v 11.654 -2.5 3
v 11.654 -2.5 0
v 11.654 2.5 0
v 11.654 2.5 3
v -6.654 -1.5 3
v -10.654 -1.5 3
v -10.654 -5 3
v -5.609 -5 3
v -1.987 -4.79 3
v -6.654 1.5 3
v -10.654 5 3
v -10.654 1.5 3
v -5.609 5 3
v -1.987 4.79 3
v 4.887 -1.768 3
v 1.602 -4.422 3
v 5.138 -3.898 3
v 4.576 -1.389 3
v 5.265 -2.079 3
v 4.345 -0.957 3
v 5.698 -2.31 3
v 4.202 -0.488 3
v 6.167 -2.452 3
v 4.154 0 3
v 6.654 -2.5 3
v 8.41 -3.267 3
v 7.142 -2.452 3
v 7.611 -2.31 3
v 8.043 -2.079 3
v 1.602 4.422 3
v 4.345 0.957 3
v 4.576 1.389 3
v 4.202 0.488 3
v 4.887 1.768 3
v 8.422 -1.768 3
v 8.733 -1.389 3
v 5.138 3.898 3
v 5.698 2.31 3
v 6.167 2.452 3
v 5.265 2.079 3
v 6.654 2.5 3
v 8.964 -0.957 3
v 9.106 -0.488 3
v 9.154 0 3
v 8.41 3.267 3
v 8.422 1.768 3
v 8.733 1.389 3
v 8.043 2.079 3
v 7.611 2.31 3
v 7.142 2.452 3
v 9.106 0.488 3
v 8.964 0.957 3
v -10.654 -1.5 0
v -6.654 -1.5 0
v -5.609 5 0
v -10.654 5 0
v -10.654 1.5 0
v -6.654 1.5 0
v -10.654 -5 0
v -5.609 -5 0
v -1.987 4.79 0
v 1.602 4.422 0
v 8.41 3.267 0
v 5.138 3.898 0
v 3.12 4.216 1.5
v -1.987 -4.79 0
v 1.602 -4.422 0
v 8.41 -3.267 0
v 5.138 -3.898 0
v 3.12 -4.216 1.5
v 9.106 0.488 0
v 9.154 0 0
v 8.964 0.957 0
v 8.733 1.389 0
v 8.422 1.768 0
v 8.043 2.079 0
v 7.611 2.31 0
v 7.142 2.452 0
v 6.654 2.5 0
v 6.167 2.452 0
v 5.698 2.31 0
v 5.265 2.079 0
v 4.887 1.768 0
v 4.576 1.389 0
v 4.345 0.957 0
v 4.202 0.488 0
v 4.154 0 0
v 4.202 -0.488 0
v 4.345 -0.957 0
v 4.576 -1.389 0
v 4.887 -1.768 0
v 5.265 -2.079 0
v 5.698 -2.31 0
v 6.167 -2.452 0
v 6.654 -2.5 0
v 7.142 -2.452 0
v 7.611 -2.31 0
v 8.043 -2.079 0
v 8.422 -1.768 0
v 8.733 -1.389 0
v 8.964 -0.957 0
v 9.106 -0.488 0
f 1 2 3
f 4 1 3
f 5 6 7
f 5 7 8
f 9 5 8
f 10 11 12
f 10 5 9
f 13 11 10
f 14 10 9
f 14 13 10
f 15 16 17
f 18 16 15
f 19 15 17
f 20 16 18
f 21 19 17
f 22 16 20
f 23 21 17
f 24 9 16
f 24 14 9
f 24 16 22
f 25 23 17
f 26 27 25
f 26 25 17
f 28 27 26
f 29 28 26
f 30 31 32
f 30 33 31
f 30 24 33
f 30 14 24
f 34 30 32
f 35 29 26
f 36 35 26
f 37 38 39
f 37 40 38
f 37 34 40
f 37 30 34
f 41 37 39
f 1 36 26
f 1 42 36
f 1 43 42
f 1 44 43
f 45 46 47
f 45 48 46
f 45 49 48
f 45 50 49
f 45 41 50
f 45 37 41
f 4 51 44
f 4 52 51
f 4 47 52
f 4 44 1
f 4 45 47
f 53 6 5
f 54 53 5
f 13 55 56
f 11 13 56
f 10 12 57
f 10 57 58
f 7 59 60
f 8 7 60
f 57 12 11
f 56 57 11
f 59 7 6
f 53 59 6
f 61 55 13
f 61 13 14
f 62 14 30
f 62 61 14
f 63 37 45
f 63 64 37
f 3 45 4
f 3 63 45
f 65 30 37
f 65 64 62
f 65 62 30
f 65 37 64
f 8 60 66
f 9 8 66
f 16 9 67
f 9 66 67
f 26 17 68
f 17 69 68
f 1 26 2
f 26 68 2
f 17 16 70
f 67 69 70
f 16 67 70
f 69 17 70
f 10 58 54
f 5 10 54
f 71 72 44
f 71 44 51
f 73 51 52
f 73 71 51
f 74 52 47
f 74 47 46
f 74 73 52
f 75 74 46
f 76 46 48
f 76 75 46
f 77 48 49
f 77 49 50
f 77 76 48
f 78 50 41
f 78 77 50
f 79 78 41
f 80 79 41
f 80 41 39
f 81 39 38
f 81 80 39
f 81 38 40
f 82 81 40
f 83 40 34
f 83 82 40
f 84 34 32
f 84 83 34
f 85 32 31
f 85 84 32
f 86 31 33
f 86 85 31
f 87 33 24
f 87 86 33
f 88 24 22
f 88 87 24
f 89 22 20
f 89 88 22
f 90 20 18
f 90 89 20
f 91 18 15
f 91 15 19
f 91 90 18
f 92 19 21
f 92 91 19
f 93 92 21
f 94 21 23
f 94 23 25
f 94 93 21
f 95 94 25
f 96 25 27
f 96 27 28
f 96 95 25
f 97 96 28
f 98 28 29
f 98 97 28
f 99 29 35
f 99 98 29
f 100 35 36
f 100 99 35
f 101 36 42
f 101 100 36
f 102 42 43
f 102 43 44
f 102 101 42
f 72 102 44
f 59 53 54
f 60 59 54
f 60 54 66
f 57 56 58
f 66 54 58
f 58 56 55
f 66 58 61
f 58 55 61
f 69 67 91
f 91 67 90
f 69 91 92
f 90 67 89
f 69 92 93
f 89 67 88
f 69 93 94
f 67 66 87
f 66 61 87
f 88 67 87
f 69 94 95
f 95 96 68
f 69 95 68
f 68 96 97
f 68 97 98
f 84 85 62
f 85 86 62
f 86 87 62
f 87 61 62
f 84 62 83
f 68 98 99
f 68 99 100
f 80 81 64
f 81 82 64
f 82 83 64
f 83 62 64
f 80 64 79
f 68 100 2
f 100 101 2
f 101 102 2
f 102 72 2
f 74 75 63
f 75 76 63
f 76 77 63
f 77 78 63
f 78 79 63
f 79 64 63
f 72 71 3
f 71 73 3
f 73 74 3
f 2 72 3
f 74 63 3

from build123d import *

# Parameters (mm, degrees)
SKETCH1_R           = 2.5
BOSS_EXTRUDE1_DEPTH = 3
SKETCH2_W           = 5
SKETCH2_H           = 1
BOSS_EXTRUDE2_DEPTH = 3
CUT_EXTRUDE1_REACH  = 15.032
SKETCH3_W           = 1
SKETCH3_H           = 3.5


with BuildPart() as part:
    # Sketch1 → Boss-Extrude1 (new body)
    with BuildSketch(Plane.XY):
        with BuildLine():
            Line((-6.654411765, -2.5), (-11.654411765, -2.5))
            Line((-11.654411765, -2.5), (-11.654411765, -5))
            Line((-11.654411765, -5), (-5.608785246, -5))
            add(Edge.make_bspline(
                [(-5.608785246, -5), (3.217675956, -4.682890968), (11.654411765, -2.5)],
                knots=[0.187203543, 0.187203543, 0.187203543, 0.737930507, 0.737930507, 0.737930507], degree=2))
            Line((11.654411765, -2.5), (11.654411765, 2.5))
            add(Edge.make_bspline(
                [(-5.608785246, 5), (3.217675956, 4.682890968), (11.654411765, 2.5)],
                knots=[0.187203543, 0.187203543, 0.187203543, 0.737930507, 0.737930507, 0.737930507], degree=2))
            Line((-5.608785246, 5), (-11.654411765, 5))
            Line((-11.654411765, 5), (-11.654411765, 2.5))
            Line((-11.654411765, 2.5), (-6.654411765, 2.5))
            Line((-6.654411765, 2.5), (-6.654411765, -2.5))
        make_face()
        with Locations((6.654411765, 0)):
            Circle(SKETCH1_R, mode=Mode.SUBTRACT)
    extrude(amount=BOSS_EXTRUDE1_DEPTH)

    # Sketch2 → Boss-Extrude2 (add)
    with BuildSketch(Plane.XY.offset(3)):
        with Locations((-9.154411765, 2)):
            Rectangle(SKETCH2_W, SKETCH2_H)
        with Locations((-9.154411765, -2)):
            Rectangle(SKETCH2_W, SKETCH2_H)
    extrude(amount=-BOSS_EXTRUDE2_DEPTH)

    # Sketch3 → Cut-Extrude1 (cut, up to next)
    with BuildSketch(Plane.XY.offset(3), mode=Mode.PRIVATE) as cut_extrude1_sk1:
        with Locations((-11.154411765, 3.25)):
            Rectangle(SKETCH3_W, SKETCH3_H)
    cut_extrude1_tool1 = extrude(cut_extrude1_sk1.sketch, amount=-CUT_EXTRUDE1_REACH, mode=Mode.PRIVATE) & part.part
    # Sketch3 → Cut-Extrude1 (cut, up to next)
    with BuildSketch(Plane.XY.offset(3), mode=Mode.PRIVATE) as cut_extrude1_sk2:
        with Locations((-11.154411765, -3.25)):
            Rectangle(SKETCH3_W, SKETCH3_H)
    cut_extrude1_tool2 = extrude(cut_extrude1_sk2.sketch, amount=-CUT_EXTRUDE1_REACH, mode=Mode.PRIVATE) & part.part
    add(cut_extrude1_tool1.solids().sort_by_distance((-11.154412, 3.25, 3))[0], mode=Mode.SUBTRACT)
    add(cut_extrude1_tool2.solids().sort_by_distance((-11.154412, -3.25, 3))[0], mode=Mode.SUBTRACT)


solid = part.part
